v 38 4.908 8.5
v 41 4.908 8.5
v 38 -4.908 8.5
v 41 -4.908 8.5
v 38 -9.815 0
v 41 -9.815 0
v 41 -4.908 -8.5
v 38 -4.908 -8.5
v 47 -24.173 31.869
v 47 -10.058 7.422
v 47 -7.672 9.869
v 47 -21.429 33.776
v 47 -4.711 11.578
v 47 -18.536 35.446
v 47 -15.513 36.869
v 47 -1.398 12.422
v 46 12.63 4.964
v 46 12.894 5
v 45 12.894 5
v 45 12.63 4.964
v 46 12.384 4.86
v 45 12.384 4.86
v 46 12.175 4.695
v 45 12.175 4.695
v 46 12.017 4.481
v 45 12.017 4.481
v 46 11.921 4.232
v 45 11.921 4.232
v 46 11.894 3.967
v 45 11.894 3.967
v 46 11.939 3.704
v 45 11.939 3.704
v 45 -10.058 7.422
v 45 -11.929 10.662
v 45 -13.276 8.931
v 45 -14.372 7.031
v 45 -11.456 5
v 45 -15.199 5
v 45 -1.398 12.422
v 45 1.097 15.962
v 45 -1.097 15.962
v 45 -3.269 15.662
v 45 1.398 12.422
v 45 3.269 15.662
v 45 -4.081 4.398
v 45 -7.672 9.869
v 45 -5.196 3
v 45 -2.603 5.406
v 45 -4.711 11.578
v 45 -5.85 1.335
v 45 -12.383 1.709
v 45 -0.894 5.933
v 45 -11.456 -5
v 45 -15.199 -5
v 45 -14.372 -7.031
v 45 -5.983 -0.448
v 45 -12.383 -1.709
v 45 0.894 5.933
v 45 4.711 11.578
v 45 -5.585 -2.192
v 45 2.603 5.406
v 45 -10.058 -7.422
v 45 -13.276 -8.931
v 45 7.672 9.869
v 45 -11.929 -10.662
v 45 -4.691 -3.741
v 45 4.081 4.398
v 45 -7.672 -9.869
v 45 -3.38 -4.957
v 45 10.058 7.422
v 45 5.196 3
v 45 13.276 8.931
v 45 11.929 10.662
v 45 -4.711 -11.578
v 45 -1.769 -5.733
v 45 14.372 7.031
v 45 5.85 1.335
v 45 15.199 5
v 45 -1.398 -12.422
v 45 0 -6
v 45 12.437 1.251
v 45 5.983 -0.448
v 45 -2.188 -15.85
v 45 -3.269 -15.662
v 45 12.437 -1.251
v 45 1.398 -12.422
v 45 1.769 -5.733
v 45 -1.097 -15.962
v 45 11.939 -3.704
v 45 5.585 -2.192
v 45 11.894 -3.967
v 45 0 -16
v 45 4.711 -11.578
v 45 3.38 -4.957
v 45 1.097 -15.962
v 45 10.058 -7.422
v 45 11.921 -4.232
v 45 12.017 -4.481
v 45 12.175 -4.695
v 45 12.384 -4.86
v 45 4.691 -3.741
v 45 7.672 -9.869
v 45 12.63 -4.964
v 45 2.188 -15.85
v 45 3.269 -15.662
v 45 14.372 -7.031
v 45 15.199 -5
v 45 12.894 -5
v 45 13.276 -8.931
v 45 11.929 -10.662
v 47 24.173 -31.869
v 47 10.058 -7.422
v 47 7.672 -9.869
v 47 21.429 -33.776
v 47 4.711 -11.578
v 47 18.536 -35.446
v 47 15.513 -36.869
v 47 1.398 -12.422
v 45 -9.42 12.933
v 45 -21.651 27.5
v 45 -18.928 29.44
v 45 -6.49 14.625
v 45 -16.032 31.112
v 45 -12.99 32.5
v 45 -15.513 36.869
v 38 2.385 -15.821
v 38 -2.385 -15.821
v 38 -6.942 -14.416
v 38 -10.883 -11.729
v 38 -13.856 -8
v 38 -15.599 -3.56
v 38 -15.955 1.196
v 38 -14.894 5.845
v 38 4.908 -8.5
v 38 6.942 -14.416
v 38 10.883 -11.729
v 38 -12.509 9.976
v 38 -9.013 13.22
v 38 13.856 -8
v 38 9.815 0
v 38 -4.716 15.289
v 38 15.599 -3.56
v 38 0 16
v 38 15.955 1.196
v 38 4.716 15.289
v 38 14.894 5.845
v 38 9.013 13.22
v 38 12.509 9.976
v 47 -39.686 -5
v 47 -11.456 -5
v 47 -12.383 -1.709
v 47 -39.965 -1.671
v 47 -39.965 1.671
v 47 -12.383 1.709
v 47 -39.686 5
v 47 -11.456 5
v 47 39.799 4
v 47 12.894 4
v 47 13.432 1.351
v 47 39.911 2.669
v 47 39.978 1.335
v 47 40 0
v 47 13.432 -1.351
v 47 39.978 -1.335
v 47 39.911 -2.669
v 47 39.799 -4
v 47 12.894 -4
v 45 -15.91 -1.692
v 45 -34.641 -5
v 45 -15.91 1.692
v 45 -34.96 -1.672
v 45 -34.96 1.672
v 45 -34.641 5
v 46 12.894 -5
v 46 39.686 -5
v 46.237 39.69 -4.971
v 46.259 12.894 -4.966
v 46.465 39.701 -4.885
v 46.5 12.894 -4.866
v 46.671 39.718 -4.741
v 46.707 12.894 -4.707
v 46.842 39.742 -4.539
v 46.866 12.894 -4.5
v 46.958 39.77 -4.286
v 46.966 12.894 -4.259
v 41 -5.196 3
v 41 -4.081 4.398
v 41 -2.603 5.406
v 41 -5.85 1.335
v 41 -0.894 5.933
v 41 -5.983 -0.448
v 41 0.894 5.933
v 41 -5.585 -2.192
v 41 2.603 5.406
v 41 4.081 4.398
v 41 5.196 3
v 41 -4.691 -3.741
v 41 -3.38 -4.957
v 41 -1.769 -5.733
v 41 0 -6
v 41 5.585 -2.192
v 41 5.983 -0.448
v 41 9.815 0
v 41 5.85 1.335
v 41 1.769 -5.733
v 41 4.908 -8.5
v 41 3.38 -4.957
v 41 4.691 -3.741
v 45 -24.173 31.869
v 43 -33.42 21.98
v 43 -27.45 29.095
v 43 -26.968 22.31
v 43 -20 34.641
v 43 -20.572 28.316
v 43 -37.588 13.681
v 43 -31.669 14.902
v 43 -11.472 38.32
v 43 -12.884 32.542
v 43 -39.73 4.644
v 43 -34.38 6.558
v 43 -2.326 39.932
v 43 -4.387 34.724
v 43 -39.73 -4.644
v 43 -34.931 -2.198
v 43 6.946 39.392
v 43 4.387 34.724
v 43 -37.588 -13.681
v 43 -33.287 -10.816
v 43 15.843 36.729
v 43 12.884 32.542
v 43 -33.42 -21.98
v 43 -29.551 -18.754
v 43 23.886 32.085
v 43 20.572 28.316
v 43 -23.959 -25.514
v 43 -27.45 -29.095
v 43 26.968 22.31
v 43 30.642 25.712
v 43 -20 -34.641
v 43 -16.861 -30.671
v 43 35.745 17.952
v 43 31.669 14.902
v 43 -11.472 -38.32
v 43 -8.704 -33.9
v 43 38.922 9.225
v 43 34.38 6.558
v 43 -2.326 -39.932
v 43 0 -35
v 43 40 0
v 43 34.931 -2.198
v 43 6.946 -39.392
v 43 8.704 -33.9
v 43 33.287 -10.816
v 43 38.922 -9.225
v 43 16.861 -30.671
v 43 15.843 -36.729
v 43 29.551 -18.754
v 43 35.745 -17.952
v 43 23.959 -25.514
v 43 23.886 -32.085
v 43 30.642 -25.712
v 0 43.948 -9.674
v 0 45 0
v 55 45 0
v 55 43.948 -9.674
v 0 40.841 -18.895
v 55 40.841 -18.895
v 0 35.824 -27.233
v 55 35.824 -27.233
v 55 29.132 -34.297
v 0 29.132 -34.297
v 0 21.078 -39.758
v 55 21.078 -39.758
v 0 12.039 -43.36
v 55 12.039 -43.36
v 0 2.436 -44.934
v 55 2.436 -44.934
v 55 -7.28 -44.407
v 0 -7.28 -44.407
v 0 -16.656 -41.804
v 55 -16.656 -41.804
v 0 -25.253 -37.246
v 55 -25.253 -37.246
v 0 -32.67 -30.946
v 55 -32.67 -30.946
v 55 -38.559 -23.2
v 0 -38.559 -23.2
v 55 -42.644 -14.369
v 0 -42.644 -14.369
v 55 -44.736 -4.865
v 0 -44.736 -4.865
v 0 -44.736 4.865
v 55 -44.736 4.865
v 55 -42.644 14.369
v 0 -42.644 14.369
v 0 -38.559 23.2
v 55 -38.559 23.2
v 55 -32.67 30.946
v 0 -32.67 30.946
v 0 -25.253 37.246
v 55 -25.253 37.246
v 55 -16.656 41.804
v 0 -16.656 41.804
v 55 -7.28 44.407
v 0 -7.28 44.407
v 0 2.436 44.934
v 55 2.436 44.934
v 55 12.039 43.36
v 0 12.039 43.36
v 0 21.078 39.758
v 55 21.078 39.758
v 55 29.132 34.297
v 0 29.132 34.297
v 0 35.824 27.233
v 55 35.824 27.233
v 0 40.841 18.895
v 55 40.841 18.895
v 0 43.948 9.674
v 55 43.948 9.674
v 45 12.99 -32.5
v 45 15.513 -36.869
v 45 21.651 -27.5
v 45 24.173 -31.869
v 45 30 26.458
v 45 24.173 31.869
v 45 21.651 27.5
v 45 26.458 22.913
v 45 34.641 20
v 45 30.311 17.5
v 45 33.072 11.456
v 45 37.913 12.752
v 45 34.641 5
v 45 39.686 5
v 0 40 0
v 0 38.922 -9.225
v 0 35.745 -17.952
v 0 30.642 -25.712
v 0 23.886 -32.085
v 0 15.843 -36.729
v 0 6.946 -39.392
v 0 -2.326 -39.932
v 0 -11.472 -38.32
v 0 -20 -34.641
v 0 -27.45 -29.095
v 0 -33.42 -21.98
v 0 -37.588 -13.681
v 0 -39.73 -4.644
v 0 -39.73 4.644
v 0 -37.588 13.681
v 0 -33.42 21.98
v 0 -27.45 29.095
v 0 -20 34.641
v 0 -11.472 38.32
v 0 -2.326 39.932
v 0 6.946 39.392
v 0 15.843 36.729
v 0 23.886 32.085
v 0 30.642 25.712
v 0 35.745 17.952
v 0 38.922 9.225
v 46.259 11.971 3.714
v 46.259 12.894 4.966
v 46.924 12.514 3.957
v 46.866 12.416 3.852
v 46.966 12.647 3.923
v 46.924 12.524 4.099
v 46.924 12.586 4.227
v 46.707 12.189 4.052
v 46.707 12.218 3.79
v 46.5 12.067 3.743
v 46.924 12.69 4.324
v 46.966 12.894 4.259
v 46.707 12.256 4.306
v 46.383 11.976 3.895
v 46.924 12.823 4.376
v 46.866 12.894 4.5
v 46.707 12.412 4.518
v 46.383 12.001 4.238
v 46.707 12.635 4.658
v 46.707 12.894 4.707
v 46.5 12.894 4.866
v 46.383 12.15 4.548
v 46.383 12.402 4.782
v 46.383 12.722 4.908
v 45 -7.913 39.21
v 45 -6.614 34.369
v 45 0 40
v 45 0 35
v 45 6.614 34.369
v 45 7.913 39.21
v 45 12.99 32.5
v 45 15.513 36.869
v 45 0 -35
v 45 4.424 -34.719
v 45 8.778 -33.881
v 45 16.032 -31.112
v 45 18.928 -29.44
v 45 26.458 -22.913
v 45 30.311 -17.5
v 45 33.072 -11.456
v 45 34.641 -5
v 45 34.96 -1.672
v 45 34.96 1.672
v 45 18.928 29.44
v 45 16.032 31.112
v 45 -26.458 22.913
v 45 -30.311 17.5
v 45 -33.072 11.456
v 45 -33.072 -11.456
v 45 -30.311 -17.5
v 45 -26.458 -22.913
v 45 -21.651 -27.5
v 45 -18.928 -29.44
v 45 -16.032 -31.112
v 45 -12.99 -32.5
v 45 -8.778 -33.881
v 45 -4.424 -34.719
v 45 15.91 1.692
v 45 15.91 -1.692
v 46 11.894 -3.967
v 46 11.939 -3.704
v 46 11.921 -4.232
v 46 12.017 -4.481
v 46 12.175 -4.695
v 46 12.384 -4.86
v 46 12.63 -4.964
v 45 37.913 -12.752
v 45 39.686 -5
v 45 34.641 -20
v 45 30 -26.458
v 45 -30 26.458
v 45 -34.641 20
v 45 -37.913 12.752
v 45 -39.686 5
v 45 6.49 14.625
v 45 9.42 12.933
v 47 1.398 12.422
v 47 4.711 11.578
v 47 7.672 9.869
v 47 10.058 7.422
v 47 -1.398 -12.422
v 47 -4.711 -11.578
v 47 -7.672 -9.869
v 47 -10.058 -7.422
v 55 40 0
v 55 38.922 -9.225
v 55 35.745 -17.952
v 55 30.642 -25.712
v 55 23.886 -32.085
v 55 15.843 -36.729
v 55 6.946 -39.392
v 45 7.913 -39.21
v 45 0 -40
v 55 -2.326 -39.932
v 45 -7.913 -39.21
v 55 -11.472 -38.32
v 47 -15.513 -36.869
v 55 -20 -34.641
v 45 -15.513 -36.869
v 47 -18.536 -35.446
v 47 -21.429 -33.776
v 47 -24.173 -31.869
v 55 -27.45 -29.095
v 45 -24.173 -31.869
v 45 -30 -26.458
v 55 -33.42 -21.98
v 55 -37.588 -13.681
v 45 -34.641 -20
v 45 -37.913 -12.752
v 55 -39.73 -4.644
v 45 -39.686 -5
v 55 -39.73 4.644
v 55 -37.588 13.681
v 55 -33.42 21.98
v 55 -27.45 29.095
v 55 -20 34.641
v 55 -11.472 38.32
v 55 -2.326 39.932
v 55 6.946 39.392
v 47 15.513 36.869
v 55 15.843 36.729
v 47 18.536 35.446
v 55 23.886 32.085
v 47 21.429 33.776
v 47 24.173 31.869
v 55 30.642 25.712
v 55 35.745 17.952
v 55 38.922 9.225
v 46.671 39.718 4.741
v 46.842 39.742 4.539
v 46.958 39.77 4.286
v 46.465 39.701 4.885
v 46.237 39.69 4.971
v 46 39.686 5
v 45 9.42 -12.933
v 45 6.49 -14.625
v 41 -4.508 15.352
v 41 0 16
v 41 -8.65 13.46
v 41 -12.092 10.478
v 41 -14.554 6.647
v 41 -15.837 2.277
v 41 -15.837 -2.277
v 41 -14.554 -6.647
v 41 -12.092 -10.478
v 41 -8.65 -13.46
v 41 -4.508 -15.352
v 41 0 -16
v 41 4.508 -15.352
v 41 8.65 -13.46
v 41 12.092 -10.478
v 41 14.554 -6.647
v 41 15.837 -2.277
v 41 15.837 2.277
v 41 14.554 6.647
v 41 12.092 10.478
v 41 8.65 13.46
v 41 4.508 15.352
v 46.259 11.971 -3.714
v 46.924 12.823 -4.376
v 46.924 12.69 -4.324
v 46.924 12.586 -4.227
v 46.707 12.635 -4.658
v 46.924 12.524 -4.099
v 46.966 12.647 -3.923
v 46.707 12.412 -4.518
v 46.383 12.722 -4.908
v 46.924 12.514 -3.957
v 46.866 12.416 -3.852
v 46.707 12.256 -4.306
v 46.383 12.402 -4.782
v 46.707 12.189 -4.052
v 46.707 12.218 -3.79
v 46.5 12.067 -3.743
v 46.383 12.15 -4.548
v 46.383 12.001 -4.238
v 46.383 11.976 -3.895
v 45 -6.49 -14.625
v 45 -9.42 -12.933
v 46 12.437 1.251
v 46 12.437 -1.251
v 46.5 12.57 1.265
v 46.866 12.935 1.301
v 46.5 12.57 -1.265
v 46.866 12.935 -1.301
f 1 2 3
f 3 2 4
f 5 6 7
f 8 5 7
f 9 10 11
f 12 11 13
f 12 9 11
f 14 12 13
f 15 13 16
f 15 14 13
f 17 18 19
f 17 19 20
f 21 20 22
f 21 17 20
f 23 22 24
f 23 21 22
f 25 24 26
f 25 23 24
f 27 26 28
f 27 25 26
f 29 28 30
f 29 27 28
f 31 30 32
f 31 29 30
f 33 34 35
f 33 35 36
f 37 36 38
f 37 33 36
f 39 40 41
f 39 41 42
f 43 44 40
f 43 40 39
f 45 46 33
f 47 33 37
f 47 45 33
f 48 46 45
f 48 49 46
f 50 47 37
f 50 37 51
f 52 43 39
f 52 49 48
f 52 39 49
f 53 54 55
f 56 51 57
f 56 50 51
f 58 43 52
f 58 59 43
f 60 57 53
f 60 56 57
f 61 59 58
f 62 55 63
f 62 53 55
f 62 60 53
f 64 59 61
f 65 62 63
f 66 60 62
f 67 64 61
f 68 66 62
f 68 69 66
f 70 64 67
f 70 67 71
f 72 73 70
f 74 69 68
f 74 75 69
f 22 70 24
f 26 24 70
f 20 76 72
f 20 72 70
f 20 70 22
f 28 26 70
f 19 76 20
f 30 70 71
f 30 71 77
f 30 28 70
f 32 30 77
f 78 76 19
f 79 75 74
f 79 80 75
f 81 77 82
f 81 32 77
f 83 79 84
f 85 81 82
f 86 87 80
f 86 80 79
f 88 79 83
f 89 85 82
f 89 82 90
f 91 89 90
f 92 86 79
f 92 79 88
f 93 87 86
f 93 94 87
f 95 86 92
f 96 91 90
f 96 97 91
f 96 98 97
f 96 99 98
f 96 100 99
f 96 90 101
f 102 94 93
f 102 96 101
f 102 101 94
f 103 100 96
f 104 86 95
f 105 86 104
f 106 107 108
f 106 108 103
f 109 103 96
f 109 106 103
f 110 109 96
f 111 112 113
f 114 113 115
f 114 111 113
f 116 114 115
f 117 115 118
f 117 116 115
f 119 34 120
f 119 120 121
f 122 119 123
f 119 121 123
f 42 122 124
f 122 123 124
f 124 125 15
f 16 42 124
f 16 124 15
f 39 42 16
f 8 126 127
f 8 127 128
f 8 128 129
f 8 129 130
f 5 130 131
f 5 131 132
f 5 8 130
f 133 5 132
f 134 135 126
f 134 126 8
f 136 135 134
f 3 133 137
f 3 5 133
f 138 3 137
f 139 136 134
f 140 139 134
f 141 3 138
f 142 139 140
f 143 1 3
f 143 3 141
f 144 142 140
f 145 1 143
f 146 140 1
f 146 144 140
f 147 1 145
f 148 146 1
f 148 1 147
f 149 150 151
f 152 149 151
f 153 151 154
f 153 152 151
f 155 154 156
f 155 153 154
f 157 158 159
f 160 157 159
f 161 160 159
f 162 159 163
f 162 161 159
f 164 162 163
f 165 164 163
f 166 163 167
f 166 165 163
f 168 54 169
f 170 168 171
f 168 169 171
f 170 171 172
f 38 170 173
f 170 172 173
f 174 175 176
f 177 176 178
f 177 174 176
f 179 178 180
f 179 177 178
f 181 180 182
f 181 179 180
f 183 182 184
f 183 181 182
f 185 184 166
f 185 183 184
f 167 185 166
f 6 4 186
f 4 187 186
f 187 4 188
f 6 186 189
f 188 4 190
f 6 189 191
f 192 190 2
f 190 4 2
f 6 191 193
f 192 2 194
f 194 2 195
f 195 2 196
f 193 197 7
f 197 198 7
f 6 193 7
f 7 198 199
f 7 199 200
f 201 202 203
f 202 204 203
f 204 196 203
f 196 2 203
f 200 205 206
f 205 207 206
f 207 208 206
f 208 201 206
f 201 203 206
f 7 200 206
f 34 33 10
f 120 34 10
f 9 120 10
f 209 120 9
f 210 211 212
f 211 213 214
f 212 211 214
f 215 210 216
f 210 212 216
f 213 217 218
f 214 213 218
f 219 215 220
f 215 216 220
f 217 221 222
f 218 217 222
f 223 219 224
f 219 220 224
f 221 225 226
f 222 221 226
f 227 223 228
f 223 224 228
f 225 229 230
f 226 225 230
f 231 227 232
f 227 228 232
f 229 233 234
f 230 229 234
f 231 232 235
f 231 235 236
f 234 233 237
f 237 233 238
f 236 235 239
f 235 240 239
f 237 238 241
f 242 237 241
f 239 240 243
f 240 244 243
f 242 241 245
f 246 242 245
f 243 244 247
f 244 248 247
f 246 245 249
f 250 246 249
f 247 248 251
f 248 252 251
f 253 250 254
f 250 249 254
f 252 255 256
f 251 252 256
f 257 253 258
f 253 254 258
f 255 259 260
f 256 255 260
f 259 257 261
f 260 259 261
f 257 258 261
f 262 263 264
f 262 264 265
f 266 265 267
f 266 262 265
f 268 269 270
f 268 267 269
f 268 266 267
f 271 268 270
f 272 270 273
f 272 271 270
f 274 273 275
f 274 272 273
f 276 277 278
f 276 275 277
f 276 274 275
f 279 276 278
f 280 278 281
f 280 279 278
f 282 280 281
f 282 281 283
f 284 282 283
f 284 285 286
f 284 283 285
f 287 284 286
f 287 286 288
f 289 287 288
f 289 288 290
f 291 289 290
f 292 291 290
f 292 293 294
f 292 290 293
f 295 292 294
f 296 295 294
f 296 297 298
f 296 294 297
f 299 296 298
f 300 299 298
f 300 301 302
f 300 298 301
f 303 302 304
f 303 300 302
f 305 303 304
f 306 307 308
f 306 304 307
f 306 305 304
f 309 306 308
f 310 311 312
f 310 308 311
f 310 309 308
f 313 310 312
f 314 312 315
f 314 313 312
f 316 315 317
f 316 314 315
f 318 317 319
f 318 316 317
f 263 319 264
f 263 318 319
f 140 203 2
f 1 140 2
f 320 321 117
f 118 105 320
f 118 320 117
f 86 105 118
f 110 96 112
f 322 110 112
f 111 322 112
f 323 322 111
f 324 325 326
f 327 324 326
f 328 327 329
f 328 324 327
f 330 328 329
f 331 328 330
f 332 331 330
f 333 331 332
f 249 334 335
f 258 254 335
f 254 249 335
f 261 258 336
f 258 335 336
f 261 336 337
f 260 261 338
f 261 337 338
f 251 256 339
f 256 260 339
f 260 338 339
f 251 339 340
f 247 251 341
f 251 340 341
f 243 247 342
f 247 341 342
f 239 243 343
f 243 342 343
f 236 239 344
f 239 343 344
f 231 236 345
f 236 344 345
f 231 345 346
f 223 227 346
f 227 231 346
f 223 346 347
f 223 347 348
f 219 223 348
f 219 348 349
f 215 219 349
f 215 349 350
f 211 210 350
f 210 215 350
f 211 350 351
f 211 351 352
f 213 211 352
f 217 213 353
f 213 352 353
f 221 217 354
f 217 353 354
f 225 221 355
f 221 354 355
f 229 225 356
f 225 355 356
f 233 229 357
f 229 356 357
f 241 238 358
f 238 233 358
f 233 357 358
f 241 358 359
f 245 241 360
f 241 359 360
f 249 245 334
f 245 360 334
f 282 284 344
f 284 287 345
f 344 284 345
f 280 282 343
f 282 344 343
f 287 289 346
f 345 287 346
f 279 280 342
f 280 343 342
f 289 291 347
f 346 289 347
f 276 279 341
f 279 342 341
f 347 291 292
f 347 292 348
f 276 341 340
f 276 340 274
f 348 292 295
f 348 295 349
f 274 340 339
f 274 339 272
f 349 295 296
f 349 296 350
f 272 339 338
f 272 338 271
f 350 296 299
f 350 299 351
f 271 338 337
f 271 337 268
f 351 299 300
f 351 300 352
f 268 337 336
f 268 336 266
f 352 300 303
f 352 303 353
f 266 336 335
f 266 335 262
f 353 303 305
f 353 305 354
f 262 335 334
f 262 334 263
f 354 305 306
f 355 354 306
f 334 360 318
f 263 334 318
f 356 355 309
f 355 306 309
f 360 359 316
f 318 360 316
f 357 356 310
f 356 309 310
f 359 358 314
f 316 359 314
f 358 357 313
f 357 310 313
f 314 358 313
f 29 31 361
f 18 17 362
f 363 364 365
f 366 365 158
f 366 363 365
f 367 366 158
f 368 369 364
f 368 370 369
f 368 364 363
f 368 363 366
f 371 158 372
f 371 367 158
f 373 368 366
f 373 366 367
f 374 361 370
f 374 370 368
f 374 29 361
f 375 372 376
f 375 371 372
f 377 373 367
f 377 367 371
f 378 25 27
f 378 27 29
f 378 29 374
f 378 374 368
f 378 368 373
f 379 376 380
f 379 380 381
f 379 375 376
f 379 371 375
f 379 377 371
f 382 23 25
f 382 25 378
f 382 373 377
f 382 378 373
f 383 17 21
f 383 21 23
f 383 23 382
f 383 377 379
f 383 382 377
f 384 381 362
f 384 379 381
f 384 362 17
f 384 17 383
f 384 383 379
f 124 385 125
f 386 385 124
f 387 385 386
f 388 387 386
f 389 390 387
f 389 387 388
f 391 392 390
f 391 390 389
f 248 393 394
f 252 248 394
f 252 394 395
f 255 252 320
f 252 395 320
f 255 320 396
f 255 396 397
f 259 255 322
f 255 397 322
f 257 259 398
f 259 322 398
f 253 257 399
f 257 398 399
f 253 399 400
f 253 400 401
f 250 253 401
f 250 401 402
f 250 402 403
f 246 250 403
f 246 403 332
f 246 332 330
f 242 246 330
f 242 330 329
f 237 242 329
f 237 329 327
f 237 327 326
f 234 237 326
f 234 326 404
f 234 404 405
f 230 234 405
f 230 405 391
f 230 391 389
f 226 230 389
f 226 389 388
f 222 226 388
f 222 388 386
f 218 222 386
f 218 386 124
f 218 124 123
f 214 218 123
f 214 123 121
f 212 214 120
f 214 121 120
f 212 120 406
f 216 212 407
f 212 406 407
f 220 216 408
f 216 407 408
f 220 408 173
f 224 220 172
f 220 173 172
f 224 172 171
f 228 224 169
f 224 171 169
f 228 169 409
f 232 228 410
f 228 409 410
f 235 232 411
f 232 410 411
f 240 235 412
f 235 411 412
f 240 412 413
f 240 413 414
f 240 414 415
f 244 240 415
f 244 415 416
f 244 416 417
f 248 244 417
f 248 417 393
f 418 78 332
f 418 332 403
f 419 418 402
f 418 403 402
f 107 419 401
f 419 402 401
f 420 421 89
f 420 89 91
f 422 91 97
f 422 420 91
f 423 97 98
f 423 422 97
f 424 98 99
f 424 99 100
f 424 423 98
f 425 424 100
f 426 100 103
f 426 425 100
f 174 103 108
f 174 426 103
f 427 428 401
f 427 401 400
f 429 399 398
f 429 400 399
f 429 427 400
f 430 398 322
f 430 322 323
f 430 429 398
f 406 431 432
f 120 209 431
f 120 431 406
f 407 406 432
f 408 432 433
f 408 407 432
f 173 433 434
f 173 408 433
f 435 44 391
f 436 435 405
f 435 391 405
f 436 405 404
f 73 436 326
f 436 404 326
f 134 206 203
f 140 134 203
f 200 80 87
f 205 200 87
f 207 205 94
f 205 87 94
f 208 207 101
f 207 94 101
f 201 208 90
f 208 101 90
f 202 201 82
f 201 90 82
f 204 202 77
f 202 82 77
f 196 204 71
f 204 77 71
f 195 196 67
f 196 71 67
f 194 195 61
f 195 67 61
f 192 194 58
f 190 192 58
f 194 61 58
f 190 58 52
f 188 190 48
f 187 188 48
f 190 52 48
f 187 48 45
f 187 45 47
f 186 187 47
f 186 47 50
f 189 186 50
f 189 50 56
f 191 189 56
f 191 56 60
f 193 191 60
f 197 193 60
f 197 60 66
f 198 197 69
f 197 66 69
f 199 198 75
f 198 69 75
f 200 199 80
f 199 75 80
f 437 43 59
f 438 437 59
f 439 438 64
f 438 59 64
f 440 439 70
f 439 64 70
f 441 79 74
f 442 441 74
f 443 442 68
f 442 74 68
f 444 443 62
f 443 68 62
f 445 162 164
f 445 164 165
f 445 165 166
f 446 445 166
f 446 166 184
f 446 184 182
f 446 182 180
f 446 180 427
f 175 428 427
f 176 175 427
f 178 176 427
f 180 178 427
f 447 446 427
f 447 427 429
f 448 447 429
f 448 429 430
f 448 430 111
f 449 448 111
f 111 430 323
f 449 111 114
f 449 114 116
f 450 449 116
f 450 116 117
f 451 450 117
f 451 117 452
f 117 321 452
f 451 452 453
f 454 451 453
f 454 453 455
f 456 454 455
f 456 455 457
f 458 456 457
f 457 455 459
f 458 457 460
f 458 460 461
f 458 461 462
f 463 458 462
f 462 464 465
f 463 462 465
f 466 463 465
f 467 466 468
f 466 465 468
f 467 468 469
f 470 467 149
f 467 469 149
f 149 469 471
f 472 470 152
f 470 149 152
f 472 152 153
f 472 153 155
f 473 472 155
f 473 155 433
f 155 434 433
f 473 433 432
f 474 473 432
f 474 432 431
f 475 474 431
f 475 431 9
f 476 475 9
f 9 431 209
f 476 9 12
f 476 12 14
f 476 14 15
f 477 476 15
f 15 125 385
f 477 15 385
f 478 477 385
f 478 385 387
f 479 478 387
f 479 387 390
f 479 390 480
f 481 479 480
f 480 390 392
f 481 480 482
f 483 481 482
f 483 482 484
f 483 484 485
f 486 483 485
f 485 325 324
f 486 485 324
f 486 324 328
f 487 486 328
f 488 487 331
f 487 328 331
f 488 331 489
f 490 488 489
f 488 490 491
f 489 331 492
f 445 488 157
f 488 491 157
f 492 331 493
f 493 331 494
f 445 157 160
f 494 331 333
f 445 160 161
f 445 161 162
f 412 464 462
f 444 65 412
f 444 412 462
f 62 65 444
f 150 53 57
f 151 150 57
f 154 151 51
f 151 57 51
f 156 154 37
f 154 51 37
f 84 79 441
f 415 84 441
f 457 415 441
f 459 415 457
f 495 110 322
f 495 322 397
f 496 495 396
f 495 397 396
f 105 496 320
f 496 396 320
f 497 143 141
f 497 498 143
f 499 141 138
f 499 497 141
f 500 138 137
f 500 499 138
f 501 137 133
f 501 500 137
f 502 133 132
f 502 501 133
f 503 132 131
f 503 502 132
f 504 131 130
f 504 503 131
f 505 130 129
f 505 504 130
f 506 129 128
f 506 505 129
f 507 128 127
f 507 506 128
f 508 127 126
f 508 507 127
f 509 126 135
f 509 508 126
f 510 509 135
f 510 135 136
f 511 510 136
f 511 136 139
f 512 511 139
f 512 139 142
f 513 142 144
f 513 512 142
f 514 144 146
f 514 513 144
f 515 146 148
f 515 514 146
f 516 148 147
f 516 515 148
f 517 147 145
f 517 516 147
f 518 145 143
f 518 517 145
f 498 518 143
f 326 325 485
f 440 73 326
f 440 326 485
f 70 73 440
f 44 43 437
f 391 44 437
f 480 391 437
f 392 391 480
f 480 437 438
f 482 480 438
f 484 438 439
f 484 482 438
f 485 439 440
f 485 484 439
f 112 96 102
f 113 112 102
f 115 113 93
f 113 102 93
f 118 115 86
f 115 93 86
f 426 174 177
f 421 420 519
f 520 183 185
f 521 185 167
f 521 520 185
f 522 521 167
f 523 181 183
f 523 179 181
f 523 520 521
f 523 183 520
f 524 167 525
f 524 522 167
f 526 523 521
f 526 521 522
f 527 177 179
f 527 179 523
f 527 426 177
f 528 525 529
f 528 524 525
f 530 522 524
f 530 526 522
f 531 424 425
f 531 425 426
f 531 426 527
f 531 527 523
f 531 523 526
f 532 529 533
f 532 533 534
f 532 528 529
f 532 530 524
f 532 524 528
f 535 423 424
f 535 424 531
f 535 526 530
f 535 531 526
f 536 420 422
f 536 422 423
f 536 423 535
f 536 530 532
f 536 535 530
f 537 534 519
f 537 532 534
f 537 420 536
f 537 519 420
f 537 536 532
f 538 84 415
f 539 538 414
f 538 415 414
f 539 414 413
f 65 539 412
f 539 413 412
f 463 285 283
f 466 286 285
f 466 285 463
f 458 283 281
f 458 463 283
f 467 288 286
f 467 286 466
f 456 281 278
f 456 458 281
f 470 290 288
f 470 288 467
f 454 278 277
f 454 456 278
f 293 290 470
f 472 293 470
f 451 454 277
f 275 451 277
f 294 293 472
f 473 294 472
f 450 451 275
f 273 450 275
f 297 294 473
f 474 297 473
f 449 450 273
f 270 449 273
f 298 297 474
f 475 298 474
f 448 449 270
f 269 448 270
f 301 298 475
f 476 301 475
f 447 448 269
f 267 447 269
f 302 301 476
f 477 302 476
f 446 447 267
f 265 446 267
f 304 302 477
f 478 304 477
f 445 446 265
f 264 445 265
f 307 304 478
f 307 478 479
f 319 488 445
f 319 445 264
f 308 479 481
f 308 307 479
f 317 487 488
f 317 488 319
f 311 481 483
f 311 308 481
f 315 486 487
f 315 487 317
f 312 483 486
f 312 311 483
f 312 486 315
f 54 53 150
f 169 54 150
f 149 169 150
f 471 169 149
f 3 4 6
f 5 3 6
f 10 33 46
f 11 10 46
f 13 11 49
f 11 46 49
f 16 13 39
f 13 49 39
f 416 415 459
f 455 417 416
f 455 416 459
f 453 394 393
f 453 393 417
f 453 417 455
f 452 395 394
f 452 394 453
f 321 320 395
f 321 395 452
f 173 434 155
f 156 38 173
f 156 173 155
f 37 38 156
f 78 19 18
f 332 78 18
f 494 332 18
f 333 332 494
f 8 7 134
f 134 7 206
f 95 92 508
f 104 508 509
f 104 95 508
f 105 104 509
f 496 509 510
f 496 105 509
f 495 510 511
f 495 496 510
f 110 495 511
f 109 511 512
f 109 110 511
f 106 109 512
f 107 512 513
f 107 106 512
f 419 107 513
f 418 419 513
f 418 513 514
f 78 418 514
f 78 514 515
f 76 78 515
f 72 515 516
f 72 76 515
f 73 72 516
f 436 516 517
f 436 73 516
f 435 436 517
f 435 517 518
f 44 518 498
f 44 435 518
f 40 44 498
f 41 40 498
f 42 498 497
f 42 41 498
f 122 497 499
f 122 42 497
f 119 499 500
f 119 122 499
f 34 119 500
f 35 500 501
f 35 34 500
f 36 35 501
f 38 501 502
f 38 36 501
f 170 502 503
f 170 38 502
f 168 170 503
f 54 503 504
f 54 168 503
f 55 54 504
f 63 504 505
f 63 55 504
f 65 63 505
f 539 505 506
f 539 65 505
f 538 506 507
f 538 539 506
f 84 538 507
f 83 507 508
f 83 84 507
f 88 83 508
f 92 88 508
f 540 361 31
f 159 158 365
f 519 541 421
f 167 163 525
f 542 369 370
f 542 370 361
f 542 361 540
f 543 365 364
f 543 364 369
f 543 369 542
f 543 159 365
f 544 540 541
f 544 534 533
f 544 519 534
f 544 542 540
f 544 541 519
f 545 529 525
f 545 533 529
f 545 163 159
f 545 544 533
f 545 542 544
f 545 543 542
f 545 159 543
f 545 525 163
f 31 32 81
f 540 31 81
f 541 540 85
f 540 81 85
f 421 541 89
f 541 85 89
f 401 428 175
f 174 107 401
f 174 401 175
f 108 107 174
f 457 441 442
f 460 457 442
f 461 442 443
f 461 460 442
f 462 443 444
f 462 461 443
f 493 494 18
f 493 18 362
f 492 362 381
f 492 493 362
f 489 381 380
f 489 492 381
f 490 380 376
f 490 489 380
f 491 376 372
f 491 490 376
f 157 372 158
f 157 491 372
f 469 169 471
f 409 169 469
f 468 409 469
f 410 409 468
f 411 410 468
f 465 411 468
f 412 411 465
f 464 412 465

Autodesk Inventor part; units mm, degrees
ref_plane "YZ Plane" through (0, 0, 0) normal (1, 0, 0) x (0, 1, 0)
ref_plane "XZ Plane" through (0, 0, 0) normal (0, 1, 0) x (-1, 0, 0)
sketch "Эскиз1" plane through (0, 0, 0) normal (1, 0, 0) x (0, 1, 0)
  circle A0 centre (0, 0) radius 45
  circle A1 centre (0, 0) radius 40
  dimension "d0" = 90
  dimension "d1" = 5
extrude "Выдавливание1" add sketch "Эскиз1" along normal blind 55
ref_plane "РабПлоскость1" through (45, 0, 0) normal (1, 0, 0) x (0, 0, -1)
sketch "Эскиз2" plane through (45, 0, 0) normal (1, 0, 0) x (0, 0, -1)
  circle A0 centre (0, 0) radius 40 projected
  circle A1 centre (0, 0) radius 35
  dimension "d5" = 5
extrude "Выдавливание2" add sketch "Эскиз2" against normal blind 2
sketch "Эскиз3" plane through (45, 0, 0) normal (1, 0, 0) x (0, 0, -1)
  circle A0 centre (0, 0) radius 6
  circle A1 centre (0, 0) radius 16
  circle A2 centre (0, 0) radius 35 projected
  dimension "d19" = 12
  dimension "d20" = 32
extrude "Выдавливание3" add sketch "Эскиз3" against normal blind 4 contours A1
sketch "Эскиз4" plane through (45, 0, 0) normal (1, 0, 0) x (0, 0, -1)
  line L0 (-5, 42) -> (5, 42)
  line L1 (5, 42) -> (5, 11.4564)
  line L2 (-5, 11.4564) -> (-5, 42)
  line L3 (0, 0) -> (0, 36.2372) construction
  arc A0 (5, 11.4564) -> (-5, 11.4564) centre (0, 0) ccw
  dimension "d32" = 10
  dimension "d33" = 25
  dimension "d34" = 42
extrude "Выдавливание4" add sketch "Эскиз4" along normal blind 2
fillet "Сопряжение1" radius 1 5 edges at (46, 11.4564, -5) (46, 11.4564, 5) (47, 25.5714, 5) (47, 12.5, 0) (47, 25.5714, -5)
pattern_circular "Круговой массив1" count 6 over 360 about axis through (45, 0, 0) along (-1, 0, 0) of "Выдавливание4"
sketch "Эскиз5" plane through (41, 0, 0) normal (-1, 0, 0) x (0, 0, 1)
  line L0 (0, 9.815) -> (8.5, 4.9075)
  line L1 (8.5, 4.9075) -> (8.5, -4.9075)
  line L2 (8.5, -4.9075) -> (0, -9.815)
  line L3 (0, -9.815) -> (-8.5, -4.9075)
  line L4 (-8.5, -4.9075) -> (-8.5, 4.9075)
  line L5 (-8.5, 4.9075) -> (0, 9.815)
  circle A0 centre (0, 0) radius 16
  circle A1 centre (0, 0) radius 16 projected
  dimension "d41" = 17
extrude "Выдавливание5" add sketch "Эскиз5" along normal blind 3
properties part number "КВ33-AN1-01-02-Диск"
